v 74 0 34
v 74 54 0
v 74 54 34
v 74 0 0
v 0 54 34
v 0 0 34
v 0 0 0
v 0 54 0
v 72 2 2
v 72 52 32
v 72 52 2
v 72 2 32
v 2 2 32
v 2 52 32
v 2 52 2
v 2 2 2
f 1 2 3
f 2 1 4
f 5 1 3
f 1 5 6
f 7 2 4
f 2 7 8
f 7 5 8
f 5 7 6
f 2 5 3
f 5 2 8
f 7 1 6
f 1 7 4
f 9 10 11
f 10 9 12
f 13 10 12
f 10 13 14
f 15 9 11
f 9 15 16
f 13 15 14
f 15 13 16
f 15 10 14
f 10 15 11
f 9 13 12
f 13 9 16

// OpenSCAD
// Parametric ESP32 enclosure

inner_length = 70;
inner_width = 50;
inner_height = 30;
wall_thickness = 2;

outer_length = inner_length + 2 * wall_thickness;
outer_width = inner_width + 2 * wall_thickness;
outer_height = inner_height + 2 * wall_thickness;

module case() {
    difference() {
        cube([outer_length, outer_width, outer_height]);
        translate([wall_thickness, wall_thickness, wall_thickness])
            cube([inner_length, inner_width, inner_height]);
    }
}

case();
